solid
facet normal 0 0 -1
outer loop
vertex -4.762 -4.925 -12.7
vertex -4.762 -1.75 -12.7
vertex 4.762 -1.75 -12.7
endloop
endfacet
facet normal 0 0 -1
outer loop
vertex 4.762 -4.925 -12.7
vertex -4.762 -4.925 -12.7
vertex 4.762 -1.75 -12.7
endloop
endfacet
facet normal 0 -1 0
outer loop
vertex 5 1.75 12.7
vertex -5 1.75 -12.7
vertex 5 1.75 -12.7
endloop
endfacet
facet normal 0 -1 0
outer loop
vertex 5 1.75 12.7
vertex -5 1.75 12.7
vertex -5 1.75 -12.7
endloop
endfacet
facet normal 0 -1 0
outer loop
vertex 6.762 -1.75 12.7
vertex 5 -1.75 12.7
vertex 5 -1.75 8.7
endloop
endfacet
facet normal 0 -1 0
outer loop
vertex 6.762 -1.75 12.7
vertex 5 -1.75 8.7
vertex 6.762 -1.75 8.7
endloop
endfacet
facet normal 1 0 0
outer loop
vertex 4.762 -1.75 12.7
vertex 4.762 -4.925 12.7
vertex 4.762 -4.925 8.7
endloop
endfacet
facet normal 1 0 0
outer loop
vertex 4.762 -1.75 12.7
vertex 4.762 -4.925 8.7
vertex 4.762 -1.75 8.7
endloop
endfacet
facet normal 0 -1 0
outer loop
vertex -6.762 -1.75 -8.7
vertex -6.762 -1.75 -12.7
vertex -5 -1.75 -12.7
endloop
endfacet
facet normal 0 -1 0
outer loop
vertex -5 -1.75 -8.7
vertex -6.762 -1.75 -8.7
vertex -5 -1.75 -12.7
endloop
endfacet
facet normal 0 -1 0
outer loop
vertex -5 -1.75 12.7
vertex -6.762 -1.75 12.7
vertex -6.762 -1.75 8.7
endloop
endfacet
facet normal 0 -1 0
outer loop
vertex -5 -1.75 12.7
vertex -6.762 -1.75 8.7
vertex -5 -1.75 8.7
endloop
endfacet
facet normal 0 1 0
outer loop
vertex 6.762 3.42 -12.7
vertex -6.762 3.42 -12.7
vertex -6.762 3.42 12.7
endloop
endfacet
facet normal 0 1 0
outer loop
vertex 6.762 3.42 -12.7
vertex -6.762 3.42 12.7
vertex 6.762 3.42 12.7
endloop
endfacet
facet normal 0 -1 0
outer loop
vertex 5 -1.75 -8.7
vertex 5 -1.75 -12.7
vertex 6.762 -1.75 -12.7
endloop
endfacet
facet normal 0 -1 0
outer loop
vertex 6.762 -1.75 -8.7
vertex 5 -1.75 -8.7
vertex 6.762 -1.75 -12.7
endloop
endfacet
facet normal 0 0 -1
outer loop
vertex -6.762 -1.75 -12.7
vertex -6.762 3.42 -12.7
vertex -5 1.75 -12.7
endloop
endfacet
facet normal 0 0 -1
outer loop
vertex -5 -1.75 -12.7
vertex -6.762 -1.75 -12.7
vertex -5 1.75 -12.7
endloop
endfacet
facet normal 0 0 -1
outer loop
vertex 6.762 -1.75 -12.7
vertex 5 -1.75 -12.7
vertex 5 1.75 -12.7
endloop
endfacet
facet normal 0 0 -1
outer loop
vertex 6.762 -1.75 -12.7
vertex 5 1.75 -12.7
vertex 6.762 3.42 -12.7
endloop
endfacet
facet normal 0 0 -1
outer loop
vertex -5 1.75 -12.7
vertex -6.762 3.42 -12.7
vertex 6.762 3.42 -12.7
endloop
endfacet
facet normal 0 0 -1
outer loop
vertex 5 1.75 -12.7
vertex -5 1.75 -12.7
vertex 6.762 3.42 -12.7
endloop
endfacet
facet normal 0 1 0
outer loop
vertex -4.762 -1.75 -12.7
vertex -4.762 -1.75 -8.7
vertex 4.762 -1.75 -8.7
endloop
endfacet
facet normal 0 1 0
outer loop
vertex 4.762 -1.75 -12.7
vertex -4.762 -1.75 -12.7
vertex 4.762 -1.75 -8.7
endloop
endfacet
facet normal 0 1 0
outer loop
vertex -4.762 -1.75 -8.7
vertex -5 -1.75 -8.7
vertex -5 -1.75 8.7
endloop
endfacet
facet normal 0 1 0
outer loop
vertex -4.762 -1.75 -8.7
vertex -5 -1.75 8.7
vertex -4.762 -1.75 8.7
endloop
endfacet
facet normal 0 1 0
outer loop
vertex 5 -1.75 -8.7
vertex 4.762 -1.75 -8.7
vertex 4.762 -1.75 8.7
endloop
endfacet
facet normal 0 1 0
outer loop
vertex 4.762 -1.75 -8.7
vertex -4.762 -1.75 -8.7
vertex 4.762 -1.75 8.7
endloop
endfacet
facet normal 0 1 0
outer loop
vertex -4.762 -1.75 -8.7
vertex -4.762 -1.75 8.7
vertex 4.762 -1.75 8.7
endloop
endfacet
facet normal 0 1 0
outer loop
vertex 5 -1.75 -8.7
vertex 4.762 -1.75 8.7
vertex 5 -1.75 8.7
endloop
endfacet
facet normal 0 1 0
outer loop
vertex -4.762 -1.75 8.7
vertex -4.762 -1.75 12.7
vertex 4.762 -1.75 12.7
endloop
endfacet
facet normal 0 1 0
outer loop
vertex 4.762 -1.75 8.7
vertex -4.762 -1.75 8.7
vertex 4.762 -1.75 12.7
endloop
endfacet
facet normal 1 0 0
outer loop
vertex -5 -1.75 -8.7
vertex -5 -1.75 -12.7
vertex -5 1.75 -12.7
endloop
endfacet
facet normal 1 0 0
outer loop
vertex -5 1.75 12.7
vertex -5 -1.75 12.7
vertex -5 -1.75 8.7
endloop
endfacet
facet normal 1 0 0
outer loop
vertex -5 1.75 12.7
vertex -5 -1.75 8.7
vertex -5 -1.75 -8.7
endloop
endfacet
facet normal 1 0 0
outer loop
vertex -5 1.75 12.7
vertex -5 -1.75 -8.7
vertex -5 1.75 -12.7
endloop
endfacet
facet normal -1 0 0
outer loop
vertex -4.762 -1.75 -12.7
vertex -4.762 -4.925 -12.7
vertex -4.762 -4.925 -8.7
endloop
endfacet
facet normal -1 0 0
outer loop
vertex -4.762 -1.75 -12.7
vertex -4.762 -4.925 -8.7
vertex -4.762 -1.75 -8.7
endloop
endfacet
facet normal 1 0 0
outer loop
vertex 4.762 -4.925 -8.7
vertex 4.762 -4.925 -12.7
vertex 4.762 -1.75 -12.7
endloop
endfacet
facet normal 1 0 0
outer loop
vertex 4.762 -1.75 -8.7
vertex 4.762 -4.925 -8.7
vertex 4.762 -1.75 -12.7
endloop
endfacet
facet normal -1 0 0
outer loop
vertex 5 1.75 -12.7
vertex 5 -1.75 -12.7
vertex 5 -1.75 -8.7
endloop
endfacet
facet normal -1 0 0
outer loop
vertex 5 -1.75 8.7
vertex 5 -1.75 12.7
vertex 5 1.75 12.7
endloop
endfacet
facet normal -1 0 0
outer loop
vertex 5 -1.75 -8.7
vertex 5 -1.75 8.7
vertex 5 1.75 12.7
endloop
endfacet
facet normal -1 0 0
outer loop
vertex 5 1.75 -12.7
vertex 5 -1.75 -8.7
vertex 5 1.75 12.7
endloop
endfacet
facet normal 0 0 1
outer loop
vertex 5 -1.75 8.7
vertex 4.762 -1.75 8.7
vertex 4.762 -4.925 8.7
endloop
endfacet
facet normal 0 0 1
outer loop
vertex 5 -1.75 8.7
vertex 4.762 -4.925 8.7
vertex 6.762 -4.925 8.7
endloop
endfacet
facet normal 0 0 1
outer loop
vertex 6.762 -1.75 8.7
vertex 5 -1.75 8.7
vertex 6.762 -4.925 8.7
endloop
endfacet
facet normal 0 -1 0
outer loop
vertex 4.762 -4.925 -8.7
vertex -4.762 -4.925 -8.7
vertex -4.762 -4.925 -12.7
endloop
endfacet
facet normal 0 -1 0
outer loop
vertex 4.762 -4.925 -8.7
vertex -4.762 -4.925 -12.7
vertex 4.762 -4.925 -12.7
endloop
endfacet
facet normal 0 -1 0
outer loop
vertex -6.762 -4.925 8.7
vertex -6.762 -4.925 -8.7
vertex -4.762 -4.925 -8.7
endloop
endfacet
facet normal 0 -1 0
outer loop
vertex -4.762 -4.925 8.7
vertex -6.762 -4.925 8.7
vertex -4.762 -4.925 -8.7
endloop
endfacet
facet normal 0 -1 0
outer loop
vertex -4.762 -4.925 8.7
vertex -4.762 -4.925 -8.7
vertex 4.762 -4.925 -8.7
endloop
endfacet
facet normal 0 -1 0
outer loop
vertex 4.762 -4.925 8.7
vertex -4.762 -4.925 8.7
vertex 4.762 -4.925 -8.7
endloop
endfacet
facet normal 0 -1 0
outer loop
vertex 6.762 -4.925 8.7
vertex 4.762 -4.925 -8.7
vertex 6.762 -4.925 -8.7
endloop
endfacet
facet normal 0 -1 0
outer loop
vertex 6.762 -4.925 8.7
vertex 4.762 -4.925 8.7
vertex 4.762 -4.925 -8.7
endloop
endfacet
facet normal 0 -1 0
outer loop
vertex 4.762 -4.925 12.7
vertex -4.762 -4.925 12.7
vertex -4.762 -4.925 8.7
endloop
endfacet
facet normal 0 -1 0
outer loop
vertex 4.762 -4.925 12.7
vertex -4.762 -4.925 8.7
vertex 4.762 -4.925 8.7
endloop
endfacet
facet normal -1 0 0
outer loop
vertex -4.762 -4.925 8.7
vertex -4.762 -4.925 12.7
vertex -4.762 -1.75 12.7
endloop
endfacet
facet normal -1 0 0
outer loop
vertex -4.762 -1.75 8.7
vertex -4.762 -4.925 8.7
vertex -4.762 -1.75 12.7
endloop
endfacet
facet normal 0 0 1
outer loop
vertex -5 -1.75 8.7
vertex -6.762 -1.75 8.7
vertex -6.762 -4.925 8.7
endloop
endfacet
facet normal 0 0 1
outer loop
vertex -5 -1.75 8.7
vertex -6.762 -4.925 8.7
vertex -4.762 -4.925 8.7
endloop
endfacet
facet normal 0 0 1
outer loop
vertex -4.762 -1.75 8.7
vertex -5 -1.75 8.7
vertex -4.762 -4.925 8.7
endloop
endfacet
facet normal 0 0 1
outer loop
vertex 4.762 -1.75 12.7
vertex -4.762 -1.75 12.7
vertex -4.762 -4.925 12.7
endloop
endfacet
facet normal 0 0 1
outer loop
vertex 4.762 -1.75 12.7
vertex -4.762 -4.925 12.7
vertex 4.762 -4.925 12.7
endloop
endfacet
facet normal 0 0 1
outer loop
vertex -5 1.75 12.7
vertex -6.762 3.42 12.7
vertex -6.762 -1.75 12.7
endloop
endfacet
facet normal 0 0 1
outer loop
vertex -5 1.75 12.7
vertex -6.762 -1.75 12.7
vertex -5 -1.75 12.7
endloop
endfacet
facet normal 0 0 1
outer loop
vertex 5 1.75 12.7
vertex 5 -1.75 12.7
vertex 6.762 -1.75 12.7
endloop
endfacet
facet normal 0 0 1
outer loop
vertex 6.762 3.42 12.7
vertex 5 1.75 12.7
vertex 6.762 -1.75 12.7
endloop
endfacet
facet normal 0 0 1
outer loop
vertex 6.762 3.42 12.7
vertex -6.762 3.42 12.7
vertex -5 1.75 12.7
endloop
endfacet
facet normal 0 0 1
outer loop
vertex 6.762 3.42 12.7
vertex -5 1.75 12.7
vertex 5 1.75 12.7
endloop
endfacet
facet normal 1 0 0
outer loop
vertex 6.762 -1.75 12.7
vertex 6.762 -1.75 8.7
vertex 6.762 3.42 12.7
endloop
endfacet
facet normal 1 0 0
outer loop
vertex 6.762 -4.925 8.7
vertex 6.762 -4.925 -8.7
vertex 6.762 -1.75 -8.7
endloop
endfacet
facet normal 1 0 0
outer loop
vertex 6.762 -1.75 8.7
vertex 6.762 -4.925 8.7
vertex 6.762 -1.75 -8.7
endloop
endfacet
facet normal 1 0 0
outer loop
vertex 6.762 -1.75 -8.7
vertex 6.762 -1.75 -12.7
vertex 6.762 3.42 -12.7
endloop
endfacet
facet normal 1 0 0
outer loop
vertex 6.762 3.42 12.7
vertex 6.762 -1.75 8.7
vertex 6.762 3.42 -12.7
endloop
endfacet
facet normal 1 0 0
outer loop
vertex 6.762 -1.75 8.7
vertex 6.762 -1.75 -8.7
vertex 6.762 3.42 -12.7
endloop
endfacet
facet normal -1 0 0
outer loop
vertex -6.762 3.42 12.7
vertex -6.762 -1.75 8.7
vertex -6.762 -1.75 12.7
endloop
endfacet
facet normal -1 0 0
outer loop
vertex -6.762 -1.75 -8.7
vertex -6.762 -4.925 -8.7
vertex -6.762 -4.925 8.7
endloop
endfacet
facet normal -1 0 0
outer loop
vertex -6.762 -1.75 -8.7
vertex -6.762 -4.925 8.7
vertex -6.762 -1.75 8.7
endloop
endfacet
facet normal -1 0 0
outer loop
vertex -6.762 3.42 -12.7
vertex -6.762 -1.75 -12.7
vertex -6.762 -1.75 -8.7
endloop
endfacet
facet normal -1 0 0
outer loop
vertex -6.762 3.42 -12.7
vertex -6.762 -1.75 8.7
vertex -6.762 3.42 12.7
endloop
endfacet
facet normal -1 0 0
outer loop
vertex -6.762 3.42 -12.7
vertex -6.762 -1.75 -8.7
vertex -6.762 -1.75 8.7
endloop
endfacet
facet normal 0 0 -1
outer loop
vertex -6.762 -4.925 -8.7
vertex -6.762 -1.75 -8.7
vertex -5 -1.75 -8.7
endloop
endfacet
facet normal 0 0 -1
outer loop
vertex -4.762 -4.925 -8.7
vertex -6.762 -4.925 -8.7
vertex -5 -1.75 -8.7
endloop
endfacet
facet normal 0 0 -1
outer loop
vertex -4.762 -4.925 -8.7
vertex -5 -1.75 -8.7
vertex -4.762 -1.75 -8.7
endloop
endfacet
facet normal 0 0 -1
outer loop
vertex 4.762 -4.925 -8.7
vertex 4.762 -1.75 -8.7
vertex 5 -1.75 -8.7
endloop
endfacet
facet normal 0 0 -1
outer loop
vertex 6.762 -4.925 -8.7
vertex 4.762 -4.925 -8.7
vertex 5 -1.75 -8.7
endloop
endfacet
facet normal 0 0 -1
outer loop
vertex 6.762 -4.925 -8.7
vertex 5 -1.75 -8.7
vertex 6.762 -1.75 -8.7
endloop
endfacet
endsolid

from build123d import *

# Parameters (mm, degrees)
SKETCH1_W           = 13.525
SKETCH1_H           = 7.40621
SKETCH1_W_2         = 10
SKETCH1_H_2         = 3.5
BOSS_EXTRUDE1_DEPTH = 12.7
SKETCH2_W           = 2
SKETCH2_H           = 3.175
CUT_EXTRUDE2_DEPTH  = 4
SKETCH2_4_W         = 13.525
SKETCH2_4_H         = 0.939
BOSS_EXTRUDE2_DEPTH = 12.7


with BuildPart() as part:
    # Sketch1 → Boss-Extrude1 (new, symmetric)
    with BuildSketch(Plane.XY):
        with Locations((0, -1.221895)):
            Rectangle(SKETCH1_W, SKETCH1_H)
        Rectangle(SKETCH1_W_2, SKETCH1_H_2, mode=Mode.SUBTRACT)
    extrude(amount=BOSS_EXTRUDE1_DEPTH, both=True)

    # Sketch2 → Cut-Extrude2 (cut)
    with BuildSketch(Plane.XY.offset(12.7)):
        with Locations((-5.7625, -3.3375)):
            Rectangle(SKETCH2_W, SKETCH2_H)
        with Locations((5.7625, -3.3375)):
            Rectangle(SKETCH2_W, SKETCH2_H)
    cut_extrude2 = extrude(amount=-CUT_EXTRUDE2_DEPTH, mode=Mode.SUBTRACT)

    # Sketch2<4> → Boss-Extrude2 (add)
    with BuildSketch(Plane.XY.offset(12.7)):
        with Locations((0, 2.95071)):
            Rectangle(SKETCH2_4_W, SKETCH2_4_H)
    boss_extrude2 = extrude(amount=-BOSS_EXTRUDE2_DEPTH)

    # Mirror1: Cut-Extrude2, Boss-Extrude2 across plane
    add(cut_extrude2.mirror(Plane.XY), mode=Mode.SUBTRACT)
    add(boss_extrude2.mirror(Plane.XY))


solid = part.part
